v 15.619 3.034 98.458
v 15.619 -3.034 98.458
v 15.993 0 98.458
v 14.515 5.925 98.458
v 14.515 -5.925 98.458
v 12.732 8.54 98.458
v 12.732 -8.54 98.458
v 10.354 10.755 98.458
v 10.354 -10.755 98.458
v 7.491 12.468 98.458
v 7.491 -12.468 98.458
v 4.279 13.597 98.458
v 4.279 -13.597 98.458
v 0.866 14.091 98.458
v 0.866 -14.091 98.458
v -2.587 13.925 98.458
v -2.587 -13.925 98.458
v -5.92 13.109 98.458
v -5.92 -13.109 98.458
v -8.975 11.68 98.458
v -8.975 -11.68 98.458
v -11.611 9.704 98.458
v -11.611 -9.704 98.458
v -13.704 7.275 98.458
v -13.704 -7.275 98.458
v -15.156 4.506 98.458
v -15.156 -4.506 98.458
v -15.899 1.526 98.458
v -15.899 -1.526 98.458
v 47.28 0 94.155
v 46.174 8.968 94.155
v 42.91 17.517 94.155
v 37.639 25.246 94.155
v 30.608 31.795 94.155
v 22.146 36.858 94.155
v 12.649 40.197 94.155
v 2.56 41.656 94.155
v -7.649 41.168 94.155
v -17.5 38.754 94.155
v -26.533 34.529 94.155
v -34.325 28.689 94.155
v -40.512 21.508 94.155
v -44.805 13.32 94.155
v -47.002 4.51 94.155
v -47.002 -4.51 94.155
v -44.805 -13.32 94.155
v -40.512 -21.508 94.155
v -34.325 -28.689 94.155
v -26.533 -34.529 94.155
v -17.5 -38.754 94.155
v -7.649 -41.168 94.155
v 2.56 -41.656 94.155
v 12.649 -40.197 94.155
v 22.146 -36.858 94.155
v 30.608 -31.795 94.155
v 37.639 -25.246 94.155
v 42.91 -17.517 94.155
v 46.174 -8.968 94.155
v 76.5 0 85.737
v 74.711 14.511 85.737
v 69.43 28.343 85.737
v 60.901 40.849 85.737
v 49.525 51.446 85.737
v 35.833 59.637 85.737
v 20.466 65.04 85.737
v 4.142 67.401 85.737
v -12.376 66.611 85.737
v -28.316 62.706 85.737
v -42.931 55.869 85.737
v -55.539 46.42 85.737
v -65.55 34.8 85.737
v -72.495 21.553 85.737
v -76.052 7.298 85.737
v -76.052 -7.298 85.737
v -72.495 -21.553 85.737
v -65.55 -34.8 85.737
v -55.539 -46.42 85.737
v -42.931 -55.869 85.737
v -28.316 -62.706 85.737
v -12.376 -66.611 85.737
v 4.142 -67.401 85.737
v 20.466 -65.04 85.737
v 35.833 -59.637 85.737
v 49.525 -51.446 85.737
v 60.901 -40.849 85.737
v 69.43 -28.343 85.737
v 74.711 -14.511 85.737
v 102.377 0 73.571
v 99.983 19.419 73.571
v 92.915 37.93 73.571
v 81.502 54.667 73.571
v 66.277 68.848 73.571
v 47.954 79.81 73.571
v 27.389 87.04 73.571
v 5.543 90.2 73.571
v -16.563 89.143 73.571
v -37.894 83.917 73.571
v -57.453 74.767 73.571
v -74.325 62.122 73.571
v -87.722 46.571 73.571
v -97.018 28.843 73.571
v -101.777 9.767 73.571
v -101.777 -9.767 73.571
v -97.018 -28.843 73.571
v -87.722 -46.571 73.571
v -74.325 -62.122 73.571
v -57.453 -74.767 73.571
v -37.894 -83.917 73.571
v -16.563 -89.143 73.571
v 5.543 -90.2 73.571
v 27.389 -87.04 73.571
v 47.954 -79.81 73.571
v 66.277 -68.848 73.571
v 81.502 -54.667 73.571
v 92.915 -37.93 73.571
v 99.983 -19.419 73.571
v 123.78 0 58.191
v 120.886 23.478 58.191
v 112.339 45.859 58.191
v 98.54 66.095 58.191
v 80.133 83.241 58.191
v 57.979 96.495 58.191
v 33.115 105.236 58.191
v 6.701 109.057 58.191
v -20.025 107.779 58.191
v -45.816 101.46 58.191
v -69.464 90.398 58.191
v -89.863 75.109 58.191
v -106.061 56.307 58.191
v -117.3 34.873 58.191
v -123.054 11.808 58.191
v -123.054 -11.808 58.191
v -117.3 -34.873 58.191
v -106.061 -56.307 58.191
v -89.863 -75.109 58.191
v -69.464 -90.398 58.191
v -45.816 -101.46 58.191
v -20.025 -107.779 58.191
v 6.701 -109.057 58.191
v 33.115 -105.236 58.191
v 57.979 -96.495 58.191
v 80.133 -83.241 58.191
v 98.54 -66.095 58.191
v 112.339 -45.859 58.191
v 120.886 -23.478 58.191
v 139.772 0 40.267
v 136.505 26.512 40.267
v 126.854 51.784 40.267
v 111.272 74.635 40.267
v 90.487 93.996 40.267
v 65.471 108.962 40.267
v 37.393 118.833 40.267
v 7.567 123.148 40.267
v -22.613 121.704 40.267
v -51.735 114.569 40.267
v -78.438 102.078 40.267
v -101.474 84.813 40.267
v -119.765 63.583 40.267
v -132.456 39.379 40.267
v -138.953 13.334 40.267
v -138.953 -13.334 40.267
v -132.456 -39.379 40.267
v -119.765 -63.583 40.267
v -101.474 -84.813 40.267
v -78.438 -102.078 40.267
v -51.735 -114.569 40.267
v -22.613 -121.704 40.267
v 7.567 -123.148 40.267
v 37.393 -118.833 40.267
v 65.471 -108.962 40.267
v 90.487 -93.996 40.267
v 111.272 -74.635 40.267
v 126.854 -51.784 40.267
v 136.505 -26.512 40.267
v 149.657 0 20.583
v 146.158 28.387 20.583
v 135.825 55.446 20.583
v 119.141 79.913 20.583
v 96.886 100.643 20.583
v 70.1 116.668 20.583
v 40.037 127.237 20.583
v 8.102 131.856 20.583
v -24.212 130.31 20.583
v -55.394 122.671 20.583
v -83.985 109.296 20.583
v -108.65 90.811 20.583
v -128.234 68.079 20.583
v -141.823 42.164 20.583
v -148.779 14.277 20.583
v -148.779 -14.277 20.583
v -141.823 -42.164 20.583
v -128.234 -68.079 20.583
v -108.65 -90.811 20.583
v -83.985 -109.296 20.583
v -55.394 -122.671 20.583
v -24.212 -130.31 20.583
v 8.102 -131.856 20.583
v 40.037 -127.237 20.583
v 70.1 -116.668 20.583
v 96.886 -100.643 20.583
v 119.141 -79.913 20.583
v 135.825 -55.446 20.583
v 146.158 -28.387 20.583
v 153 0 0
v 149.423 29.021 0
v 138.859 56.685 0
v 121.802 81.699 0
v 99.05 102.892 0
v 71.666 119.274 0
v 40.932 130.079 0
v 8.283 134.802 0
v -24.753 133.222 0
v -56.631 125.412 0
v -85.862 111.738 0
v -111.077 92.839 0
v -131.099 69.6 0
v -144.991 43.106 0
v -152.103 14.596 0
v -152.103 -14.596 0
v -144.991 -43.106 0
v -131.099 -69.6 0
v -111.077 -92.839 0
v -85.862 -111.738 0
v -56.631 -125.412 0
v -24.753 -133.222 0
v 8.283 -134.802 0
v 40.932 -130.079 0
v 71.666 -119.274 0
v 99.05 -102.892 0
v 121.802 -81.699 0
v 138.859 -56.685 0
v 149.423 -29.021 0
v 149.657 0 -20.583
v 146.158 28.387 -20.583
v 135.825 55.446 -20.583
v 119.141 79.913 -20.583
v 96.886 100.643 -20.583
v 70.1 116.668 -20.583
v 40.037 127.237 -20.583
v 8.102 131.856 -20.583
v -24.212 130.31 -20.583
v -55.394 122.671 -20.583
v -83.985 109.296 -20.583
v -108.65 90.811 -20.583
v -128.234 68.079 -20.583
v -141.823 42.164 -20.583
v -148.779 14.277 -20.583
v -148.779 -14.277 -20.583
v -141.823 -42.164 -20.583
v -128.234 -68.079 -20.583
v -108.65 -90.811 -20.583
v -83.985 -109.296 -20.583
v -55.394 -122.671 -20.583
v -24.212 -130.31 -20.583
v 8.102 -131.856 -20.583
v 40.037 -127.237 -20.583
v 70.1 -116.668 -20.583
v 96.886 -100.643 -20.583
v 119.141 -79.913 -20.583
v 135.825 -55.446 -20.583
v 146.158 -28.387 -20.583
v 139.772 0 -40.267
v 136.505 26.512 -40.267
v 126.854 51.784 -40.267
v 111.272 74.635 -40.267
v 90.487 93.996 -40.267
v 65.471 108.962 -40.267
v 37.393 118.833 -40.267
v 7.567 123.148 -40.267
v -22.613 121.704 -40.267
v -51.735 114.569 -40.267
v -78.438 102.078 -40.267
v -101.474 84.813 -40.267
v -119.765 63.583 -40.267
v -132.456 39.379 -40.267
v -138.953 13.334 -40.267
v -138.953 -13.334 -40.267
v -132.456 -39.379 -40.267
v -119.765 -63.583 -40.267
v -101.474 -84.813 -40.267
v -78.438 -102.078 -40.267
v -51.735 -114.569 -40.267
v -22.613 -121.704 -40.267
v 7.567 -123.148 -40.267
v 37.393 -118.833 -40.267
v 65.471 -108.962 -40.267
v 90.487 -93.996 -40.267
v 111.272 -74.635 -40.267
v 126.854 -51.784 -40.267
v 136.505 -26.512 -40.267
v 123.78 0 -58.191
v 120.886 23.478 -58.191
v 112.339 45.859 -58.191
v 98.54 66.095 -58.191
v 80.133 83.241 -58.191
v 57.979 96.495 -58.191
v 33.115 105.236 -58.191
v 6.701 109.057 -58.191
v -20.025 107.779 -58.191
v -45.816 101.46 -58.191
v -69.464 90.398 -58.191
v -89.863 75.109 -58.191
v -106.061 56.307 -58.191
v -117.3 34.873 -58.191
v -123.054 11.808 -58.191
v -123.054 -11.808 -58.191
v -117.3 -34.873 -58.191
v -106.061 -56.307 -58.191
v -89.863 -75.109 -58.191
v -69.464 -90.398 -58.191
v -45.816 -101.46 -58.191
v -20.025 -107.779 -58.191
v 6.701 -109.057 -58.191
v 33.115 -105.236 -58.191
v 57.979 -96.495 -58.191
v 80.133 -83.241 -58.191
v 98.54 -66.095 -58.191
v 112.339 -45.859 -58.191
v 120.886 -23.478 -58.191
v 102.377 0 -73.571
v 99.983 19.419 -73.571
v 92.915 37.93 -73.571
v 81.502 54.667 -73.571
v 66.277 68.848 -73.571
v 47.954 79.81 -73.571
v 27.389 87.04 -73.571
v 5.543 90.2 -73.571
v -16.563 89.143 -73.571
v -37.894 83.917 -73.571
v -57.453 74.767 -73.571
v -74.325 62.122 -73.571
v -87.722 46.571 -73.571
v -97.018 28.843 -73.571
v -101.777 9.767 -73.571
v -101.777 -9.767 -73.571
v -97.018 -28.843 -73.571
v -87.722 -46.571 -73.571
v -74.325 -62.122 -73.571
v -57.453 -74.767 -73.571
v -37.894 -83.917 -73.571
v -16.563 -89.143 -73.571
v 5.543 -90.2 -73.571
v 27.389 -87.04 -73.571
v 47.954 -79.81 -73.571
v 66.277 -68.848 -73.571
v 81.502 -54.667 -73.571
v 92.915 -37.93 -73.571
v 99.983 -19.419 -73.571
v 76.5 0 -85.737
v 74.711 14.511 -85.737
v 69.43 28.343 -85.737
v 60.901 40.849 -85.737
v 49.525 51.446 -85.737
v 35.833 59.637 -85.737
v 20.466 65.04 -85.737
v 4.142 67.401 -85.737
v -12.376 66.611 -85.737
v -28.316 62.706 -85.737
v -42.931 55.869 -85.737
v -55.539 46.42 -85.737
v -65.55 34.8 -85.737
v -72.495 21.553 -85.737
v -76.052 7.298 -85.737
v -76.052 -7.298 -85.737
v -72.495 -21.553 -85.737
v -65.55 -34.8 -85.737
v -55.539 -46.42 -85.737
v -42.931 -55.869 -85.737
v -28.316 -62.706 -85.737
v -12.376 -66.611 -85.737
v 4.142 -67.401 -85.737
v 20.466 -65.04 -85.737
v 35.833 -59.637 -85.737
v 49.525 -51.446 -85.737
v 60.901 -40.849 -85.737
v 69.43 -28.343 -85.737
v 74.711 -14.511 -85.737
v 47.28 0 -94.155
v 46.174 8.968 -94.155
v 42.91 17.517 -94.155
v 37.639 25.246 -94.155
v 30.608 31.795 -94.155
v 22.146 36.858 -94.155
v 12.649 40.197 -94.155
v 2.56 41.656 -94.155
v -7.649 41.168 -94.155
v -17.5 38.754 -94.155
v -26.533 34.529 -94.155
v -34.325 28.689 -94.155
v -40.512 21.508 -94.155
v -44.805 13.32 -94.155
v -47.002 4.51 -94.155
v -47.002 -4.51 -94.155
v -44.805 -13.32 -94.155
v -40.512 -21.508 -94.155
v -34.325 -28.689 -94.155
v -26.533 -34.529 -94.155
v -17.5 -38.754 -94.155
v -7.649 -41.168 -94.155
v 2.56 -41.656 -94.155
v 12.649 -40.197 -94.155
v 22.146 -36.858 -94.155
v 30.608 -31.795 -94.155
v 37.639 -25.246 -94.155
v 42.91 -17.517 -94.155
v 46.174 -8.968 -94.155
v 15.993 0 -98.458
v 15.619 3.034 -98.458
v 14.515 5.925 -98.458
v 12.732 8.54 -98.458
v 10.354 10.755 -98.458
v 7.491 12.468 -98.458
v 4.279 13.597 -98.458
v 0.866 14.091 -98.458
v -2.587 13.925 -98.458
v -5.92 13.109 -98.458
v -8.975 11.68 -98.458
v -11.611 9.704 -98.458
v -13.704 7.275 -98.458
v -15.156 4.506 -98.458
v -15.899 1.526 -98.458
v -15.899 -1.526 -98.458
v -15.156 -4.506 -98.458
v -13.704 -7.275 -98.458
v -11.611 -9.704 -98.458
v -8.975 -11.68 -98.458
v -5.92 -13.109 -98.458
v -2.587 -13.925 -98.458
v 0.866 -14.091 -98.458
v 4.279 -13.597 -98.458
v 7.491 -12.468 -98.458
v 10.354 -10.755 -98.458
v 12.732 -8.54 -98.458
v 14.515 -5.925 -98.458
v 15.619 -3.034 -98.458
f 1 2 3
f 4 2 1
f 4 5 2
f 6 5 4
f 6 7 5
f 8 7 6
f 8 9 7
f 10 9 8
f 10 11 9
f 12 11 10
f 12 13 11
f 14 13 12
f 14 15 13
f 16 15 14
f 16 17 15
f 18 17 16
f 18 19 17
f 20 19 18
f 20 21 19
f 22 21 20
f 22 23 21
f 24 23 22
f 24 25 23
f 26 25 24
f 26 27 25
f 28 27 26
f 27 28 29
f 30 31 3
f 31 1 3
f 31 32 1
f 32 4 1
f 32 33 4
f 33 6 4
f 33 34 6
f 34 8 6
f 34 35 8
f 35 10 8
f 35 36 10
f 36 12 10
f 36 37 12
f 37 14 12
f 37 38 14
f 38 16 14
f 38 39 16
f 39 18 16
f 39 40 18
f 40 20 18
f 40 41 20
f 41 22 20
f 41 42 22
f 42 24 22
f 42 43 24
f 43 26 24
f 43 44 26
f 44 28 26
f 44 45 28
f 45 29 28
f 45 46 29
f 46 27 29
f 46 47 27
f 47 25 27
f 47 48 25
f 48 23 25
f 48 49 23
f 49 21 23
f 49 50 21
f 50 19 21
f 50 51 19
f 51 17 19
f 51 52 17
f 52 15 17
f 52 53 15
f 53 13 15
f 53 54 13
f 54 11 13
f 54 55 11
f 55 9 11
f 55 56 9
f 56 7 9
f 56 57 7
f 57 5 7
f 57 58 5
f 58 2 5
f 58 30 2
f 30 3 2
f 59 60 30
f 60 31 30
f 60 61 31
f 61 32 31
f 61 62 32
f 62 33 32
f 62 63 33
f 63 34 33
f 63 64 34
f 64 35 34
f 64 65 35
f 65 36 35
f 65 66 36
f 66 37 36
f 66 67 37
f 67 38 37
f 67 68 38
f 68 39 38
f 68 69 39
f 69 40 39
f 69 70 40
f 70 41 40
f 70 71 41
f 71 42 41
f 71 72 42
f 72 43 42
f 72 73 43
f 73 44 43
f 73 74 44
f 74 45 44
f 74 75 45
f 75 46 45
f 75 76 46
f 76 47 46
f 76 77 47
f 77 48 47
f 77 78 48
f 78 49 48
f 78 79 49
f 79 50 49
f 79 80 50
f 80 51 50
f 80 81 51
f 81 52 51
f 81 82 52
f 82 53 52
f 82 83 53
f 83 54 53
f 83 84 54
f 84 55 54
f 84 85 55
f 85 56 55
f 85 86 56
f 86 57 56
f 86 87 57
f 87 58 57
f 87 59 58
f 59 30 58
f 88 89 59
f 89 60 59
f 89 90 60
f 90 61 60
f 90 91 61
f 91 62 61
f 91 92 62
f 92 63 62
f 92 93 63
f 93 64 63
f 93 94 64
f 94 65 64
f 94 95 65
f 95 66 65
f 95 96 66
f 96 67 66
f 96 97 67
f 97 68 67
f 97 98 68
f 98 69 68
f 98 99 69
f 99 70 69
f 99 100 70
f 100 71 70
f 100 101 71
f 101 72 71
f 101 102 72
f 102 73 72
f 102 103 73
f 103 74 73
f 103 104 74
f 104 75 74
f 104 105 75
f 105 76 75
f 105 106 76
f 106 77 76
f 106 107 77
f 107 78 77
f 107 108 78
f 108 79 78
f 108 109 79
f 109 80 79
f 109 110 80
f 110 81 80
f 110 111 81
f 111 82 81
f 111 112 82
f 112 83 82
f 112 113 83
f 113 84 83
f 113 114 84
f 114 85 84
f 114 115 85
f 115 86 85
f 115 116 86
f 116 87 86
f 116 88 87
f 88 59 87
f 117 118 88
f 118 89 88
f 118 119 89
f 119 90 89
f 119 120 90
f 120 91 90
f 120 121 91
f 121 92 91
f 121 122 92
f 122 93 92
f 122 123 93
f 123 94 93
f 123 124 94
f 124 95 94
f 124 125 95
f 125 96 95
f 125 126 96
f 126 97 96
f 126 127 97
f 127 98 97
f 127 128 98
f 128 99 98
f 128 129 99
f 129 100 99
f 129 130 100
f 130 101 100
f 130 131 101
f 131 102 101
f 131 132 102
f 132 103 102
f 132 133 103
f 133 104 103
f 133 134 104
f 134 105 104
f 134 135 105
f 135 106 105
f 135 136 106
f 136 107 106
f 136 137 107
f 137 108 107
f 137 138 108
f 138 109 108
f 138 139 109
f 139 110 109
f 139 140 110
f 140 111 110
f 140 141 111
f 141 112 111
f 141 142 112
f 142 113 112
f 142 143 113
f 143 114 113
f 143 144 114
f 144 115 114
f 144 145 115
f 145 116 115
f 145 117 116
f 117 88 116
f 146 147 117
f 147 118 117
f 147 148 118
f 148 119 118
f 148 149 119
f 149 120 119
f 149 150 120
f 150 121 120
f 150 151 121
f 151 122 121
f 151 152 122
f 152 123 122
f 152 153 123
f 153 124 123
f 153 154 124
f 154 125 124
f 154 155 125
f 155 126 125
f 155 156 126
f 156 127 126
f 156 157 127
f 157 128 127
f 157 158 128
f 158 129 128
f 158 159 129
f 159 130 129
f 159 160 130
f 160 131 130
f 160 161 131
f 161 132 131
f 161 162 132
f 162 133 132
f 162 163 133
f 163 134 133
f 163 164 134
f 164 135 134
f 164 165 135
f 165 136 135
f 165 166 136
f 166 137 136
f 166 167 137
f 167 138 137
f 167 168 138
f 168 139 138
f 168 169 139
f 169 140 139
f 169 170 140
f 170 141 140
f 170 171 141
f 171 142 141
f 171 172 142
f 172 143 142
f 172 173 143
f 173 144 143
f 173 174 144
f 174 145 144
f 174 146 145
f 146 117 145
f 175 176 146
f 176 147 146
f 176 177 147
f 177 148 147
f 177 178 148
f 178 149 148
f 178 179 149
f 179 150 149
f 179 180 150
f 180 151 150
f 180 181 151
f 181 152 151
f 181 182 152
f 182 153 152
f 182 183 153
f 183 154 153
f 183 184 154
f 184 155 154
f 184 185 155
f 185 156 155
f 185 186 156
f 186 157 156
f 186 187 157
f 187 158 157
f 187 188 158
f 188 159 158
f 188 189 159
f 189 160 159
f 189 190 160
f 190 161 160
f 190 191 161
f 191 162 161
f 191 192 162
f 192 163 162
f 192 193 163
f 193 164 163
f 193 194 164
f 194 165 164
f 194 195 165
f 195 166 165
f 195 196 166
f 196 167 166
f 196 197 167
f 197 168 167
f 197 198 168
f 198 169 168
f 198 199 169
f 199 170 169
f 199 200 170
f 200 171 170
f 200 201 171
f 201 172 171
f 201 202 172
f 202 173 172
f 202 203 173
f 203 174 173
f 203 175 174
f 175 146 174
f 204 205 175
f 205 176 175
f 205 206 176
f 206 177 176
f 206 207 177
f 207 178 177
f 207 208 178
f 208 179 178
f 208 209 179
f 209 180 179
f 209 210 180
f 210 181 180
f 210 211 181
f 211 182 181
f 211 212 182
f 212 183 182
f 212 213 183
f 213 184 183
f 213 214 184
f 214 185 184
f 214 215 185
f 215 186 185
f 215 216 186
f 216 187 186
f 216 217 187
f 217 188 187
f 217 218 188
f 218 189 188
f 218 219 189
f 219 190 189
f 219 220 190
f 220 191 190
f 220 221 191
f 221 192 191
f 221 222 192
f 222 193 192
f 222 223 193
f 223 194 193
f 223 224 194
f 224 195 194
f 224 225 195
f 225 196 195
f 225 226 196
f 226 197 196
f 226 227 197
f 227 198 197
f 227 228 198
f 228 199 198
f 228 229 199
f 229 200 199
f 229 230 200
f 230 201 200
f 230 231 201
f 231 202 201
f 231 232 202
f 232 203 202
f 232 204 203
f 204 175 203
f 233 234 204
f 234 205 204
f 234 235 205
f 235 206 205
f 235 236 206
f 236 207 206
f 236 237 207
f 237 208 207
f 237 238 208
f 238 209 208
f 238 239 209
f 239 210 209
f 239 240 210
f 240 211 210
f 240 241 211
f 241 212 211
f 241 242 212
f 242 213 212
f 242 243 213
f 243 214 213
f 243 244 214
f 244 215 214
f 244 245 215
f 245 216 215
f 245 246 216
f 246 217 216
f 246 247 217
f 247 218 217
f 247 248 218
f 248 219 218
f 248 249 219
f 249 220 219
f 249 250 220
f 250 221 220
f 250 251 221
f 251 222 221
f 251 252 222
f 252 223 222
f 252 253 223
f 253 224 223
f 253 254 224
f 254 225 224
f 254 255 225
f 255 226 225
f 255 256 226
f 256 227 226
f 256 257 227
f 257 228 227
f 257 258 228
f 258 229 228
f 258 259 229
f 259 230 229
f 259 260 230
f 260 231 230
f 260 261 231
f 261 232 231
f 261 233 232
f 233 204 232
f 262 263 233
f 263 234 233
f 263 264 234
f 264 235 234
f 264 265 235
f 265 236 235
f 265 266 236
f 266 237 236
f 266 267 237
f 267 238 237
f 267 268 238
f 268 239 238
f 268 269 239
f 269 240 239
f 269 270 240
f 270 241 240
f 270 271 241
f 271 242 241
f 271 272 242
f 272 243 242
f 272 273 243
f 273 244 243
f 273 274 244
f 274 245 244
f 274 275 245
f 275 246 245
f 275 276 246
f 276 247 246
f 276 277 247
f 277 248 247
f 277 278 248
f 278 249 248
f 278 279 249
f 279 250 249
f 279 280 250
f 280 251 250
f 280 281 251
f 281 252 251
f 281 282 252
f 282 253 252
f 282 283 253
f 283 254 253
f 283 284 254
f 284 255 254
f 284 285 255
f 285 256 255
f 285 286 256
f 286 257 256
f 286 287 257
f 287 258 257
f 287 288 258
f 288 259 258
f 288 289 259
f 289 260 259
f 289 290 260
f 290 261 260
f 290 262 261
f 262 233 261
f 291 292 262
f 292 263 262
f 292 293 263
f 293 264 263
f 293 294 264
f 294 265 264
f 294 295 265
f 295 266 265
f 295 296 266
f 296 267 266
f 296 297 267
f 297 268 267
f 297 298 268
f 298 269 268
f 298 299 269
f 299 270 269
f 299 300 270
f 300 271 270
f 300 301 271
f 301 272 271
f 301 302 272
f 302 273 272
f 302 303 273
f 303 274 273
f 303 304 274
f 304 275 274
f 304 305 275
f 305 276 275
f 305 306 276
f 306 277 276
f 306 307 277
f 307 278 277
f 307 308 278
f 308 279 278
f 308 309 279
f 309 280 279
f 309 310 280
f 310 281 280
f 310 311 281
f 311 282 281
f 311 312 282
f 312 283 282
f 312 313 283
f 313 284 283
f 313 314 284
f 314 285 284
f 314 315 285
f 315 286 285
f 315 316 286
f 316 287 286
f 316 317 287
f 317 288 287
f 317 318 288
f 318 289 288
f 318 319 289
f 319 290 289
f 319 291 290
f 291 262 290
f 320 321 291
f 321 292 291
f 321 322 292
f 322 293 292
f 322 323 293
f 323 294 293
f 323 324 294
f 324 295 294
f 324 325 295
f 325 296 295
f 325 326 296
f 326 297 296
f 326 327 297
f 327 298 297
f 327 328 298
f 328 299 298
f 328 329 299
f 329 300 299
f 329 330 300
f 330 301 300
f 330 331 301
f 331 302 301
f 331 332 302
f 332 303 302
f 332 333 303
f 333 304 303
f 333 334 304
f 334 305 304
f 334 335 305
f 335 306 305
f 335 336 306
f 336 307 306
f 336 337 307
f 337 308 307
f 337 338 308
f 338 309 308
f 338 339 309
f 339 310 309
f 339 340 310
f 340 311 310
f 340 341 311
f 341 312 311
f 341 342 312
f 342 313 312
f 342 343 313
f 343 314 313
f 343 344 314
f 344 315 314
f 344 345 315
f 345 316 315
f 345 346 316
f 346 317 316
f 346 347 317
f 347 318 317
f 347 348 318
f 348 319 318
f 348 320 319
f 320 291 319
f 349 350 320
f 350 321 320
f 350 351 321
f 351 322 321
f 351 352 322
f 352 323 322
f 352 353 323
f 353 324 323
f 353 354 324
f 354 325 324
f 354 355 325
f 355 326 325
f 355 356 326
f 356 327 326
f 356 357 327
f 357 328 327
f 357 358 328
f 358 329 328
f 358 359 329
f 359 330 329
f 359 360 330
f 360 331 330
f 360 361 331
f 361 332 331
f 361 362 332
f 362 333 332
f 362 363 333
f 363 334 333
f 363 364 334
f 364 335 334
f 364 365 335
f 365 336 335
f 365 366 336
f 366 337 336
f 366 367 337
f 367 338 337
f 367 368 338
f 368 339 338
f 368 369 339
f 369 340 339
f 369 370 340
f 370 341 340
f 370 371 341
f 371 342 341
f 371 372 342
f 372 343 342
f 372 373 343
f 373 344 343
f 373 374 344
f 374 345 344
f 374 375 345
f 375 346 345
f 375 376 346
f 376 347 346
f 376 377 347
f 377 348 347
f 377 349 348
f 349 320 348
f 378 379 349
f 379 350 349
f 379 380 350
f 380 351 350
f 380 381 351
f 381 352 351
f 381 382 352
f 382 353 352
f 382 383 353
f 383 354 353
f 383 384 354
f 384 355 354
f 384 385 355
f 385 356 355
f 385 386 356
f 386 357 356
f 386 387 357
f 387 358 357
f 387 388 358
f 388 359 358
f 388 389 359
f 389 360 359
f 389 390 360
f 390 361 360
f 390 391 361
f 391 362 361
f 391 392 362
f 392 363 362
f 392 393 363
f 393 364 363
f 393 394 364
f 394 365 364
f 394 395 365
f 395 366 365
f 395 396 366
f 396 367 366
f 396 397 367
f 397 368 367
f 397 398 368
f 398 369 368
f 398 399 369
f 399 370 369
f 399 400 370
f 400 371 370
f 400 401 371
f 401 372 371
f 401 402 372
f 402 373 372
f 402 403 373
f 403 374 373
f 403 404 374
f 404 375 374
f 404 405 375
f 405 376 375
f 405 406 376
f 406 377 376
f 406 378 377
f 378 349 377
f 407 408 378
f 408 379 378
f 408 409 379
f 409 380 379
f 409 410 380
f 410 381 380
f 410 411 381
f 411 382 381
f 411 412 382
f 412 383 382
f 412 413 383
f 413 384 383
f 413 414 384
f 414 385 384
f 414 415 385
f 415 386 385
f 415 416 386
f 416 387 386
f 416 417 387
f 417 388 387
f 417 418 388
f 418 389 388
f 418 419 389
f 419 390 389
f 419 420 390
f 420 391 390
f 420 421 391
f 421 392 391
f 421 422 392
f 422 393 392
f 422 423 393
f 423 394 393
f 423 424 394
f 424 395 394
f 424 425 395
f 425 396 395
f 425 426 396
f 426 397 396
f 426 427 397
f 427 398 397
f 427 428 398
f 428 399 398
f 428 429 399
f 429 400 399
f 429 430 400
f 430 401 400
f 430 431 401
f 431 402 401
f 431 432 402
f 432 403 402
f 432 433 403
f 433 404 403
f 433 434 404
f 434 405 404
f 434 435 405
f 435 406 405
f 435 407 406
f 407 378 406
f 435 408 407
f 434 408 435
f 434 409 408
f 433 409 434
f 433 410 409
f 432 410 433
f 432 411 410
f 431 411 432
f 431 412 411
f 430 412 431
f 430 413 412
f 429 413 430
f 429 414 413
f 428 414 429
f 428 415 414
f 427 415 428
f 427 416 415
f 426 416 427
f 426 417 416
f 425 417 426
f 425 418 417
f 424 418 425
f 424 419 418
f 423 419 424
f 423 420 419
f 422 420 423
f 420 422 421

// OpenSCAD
// Generated by SolidPython 1.0.1 on 2020-07-29 00:46:53


scale(v = [17, 15, 11]) {
	sphere(r = 9);
}
/***********************************************
*********      SolidPython code:      **********
************************************************
 
# import packages: SolidPython
from solid import *
from solid.utils import *
from itertools import chain, combinations, permutations


class Resize:

    def __init__(self, scad_file):
        self.scad_file = scad_file
        #self.scad_file = import_scad(scad_file)
        # cone/cylinder param:
        self.r1 = 0
        self.r2 = 0
        self.h = 0
        # rectangular prism param:
        self.w = 0
        self.l = 0
        # ellipse param:
        self.r = 0

    # import OpenScad code (file name corresponds to shape)


    # classify shape + parameters
    def assign(self, param1, param2, param3):
        if self.scad_file == 'cone.scad':
            self.r1 = param1
            self.r2 = param2
            self.h = param3
        elif self.scad_file == 'cylinder.scad':
            self.r1 = param1
            self.r2 = param2
            self.h = param3
        elif self.scad_file == 'rectangularPrism.scad':
            self.h = param1
            self.l = param2
            self.w = param3
        else:
            self.r = param1
            self.h = param2

    # resize parameters
    def iterate(self):
        x = range(3, 20, 2)
        i = 1
        if self.scad_file == 'cone.scad':
            tempList = list(permutations(x, 2))
            for temp in tempList:
                param1 = temp[0]
                param2 = temp[1]
                filepath = 'produced_scad_files/' + 'cone' + str(param1) + '_' + str(param2) + '_' + '.scad'
                scad_render_to_file(cylinder(h=param1, r1=param2, r2=0), filepath)

        elif self.scad_file == 'cylinder.scad':
            tempList = list(permutations(x, 3))
            for temp in tempList:
                param1 = temp[0]
                param2 = temp[1]
                filepath = 'produced_scad_files/' + 'cylinder' + str(param1) + '_' + str(param2) + '_' + '.scad'
                scad_render_to_file(cylinder(h=param1, r1=param2, r2=param2), filepath)

        elif self.scad_file == 'rectangularPrism.scad':
            tempList = list(permutations(x, 3))
            for temp in tempList:
                param1 = temp[0]
                param2 = temp[1]
                param3 = temp[2]
                filepath = 'produced_scad_files/' + 'rectangularPrism' + str(param1) + '_' + str(param2) + '_' + str(
                    param3) + '.scad'
                scad_render_to_file(cube(size=(param1, param2, param3)), filepath)

        elif self.scad_file == 'ellipse.scad':
            tempList = list(permutations(x, 4))
            for temp in tempList:
                param1 = temp[0]
                param2 = temp[1]
                param3 = temp[2]
                param4 = temp[3]
                filepath = 'produced_scad_files/' + 'ellipse' + str(param1) + '_' + str(param2) + '_' + str(param3) + '_' + str(param4) + '.scad'
                scad_render_to_file(scale([param1, param2, param3])(sphere(r=param4)), filepath)

    def render_to_scadfile(self):
        scad_render_to_file(scad, 'example.scad') 
 
************************************************/
